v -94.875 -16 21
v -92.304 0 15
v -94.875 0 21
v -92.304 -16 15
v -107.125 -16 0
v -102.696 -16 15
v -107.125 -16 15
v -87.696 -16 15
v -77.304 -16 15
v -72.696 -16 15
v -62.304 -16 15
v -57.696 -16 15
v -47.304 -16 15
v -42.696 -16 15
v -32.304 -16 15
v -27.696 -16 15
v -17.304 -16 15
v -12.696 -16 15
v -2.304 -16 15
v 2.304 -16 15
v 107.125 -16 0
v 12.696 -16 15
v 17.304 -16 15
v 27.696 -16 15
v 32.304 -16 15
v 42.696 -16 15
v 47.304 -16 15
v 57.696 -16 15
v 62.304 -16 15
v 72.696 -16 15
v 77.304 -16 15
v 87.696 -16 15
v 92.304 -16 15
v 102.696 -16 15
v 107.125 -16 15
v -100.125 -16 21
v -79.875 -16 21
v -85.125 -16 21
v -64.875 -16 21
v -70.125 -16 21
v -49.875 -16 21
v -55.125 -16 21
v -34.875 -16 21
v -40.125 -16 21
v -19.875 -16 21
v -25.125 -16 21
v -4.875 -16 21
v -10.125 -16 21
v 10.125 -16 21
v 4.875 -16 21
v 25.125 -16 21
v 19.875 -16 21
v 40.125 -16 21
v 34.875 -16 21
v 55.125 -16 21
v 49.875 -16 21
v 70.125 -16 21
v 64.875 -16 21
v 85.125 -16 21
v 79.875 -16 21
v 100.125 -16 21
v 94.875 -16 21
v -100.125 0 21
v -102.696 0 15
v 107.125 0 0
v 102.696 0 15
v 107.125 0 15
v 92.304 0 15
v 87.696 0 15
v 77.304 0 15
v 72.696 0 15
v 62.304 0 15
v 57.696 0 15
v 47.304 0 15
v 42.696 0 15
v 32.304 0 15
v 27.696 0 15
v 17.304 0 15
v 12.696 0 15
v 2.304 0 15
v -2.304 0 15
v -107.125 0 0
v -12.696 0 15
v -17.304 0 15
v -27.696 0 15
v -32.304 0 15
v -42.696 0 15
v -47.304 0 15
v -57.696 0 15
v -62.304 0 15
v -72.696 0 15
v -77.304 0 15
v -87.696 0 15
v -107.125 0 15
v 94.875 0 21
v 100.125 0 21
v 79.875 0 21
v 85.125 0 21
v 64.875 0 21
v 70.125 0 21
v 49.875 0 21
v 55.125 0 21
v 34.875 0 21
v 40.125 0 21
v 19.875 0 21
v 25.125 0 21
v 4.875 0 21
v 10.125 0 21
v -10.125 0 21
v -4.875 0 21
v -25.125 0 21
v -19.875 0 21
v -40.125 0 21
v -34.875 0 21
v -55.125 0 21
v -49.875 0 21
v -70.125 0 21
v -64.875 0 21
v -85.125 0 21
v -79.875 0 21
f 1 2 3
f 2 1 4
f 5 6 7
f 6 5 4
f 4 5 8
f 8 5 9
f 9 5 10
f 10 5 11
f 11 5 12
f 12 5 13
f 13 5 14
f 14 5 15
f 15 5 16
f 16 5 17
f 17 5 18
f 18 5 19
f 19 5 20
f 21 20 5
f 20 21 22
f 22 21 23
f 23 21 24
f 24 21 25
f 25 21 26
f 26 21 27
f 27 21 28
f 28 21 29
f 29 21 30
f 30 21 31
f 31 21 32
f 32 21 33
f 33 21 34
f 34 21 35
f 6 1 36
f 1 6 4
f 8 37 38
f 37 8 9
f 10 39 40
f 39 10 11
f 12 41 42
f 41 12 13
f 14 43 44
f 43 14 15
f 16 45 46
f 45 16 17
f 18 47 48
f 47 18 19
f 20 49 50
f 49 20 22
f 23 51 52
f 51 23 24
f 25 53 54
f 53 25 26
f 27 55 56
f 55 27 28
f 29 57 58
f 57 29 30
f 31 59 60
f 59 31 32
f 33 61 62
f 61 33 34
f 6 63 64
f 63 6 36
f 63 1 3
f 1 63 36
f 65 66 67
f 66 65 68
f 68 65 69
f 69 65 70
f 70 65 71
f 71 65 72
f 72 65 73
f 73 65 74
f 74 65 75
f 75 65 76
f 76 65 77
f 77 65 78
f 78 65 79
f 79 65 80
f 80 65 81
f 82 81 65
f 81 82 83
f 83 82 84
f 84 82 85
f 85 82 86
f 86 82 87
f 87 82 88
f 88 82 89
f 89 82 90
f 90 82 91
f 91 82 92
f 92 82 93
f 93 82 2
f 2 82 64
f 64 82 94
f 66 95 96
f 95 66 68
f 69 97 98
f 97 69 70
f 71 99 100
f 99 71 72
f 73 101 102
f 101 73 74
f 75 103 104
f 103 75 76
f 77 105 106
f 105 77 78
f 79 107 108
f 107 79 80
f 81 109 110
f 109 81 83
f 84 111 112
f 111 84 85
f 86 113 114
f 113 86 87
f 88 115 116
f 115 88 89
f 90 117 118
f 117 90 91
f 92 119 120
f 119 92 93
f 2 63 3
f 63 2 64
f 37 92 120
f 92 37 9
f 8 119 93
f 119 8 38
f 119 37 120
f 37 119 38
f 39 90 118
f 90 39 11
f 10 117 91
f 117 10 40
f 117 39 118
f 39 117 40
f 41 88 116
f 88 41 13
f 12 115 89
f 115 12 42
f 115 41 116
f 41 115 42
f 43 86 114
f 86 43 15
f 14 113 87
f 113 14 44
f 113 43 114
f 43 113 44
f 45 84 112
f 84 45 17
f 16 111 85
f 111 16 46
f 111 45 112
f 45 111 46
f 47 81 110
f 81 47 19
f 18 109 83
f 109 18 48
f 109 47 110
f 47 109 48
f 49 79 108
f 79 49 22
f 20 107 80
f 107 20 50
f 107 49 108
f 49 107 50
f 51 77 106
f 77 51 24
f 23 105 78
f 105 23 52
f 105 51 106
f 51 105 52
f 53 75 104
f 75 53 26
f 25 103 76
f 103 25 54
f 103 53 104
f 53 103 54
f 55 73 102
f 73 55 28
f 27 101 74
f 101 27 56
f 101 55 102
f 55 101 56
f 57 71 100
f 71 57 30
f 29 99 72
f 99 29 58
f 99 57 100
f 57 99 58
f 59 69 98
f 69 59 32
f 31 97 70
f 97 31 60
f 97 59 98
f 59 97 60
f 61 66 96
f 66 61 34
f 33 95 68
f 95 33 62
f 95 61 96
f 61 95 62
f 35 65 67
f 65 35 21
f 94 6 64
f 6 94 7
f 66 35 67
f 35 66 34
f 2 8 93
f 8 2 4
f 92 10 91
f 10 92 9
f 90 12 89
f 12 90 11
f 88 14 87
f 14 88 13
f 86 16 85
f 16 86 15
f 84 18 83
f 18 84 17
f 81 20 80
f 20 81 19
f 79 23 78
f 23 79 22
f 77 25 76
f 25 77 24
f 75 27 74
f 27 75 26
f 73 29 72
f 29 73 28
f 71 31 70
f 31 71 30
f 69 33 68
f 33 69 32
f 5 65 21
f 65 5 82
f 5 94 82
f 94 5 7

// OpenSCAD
$fn = 32;

// ----------------------------------------------------------------------
// Toothed rack, 14 teeth
// 15 mm pitch, 6 mm teeth
// ----------------------------------------------------------------------

// --- parameters (mm) ---
bar_w = 16;      // bar width (Y)
bar_h = 15;      // bar height (Z)
teeth = 14;      // number of teeth
pitch = 15;      // tooth pitch
tooth_h = 6;     // tooth height above the bar
root_w = 11.25;  // tooth width at the root
crest_w = 5.25;  // tooth width at the crest

// --- derived feature positions (mm) ---
span = (teeth - 1) * pitch;  // = 195   distance between the outer teeth
bar_l = span + root_w + 8;   // = 214.25   bar length: teeth plus 4 mm at each end
tooth_x = -span / 2;         // = -97.5   X of the first tooth
height = bar_h + tooth_h;    // = 21   overall height
feature_centers = [
  [tooth_x + 0 * pitch, -bar_w / 2],
  [tooth_x + 1 * pitch, -bar_w / 2],
  [tooth_x + 2 * pitch, -bar_w / 2],
  [tooth_x + 3 * pitch, -bar_w / 2],
  [tooth_x + 4 * pitch, -bar_w / 2],
  [tooth_x + 5 * pitch, -bar_w / 2],
  [tooth_x + 6 * pitch, -bar_w / 2],
  [tooth_x + 7 * pitch, -bar_w / 2],
  [tooth_x + 8 * pitch, -bar_w / 2],
  [tooth_x + 9 * pitch, -bar_w / 2],
  [tooth_x + 10 * pitch, -bar_w / 2],
  [tooth_x + 11 * pitch, -bar_w / 2],
  [tooth_x + 12 * pitch, -bar_w / 2],
  [tooth_x + 13 * pitch, -bar_w / 2]
];   // tooth centre line, drives the tooth loop

// bar with a rack of teeth, one extruded trapezoium per centre
module rack_tooth() {
  linear_extrude(height = bar_w)
    polygon(points = [
      [0, 0],
      [root_w, 0],
      [root_w / 2 + crest_w / 2, tooth_h + 1],
      [root_w / 2 - crest_w / 2, tooth_h + 1]
    ]);
}

union() {
  translate([-bar_l / 2, -bar_w, 0]) cube([bar_l, bar_w, bar_h]);
  for (centre = feature_centers)
    translate([centre[0] - root_w / 2, 0, bar_h - 1]) rotate([90, 0, 0]) rack_tooth();
}
